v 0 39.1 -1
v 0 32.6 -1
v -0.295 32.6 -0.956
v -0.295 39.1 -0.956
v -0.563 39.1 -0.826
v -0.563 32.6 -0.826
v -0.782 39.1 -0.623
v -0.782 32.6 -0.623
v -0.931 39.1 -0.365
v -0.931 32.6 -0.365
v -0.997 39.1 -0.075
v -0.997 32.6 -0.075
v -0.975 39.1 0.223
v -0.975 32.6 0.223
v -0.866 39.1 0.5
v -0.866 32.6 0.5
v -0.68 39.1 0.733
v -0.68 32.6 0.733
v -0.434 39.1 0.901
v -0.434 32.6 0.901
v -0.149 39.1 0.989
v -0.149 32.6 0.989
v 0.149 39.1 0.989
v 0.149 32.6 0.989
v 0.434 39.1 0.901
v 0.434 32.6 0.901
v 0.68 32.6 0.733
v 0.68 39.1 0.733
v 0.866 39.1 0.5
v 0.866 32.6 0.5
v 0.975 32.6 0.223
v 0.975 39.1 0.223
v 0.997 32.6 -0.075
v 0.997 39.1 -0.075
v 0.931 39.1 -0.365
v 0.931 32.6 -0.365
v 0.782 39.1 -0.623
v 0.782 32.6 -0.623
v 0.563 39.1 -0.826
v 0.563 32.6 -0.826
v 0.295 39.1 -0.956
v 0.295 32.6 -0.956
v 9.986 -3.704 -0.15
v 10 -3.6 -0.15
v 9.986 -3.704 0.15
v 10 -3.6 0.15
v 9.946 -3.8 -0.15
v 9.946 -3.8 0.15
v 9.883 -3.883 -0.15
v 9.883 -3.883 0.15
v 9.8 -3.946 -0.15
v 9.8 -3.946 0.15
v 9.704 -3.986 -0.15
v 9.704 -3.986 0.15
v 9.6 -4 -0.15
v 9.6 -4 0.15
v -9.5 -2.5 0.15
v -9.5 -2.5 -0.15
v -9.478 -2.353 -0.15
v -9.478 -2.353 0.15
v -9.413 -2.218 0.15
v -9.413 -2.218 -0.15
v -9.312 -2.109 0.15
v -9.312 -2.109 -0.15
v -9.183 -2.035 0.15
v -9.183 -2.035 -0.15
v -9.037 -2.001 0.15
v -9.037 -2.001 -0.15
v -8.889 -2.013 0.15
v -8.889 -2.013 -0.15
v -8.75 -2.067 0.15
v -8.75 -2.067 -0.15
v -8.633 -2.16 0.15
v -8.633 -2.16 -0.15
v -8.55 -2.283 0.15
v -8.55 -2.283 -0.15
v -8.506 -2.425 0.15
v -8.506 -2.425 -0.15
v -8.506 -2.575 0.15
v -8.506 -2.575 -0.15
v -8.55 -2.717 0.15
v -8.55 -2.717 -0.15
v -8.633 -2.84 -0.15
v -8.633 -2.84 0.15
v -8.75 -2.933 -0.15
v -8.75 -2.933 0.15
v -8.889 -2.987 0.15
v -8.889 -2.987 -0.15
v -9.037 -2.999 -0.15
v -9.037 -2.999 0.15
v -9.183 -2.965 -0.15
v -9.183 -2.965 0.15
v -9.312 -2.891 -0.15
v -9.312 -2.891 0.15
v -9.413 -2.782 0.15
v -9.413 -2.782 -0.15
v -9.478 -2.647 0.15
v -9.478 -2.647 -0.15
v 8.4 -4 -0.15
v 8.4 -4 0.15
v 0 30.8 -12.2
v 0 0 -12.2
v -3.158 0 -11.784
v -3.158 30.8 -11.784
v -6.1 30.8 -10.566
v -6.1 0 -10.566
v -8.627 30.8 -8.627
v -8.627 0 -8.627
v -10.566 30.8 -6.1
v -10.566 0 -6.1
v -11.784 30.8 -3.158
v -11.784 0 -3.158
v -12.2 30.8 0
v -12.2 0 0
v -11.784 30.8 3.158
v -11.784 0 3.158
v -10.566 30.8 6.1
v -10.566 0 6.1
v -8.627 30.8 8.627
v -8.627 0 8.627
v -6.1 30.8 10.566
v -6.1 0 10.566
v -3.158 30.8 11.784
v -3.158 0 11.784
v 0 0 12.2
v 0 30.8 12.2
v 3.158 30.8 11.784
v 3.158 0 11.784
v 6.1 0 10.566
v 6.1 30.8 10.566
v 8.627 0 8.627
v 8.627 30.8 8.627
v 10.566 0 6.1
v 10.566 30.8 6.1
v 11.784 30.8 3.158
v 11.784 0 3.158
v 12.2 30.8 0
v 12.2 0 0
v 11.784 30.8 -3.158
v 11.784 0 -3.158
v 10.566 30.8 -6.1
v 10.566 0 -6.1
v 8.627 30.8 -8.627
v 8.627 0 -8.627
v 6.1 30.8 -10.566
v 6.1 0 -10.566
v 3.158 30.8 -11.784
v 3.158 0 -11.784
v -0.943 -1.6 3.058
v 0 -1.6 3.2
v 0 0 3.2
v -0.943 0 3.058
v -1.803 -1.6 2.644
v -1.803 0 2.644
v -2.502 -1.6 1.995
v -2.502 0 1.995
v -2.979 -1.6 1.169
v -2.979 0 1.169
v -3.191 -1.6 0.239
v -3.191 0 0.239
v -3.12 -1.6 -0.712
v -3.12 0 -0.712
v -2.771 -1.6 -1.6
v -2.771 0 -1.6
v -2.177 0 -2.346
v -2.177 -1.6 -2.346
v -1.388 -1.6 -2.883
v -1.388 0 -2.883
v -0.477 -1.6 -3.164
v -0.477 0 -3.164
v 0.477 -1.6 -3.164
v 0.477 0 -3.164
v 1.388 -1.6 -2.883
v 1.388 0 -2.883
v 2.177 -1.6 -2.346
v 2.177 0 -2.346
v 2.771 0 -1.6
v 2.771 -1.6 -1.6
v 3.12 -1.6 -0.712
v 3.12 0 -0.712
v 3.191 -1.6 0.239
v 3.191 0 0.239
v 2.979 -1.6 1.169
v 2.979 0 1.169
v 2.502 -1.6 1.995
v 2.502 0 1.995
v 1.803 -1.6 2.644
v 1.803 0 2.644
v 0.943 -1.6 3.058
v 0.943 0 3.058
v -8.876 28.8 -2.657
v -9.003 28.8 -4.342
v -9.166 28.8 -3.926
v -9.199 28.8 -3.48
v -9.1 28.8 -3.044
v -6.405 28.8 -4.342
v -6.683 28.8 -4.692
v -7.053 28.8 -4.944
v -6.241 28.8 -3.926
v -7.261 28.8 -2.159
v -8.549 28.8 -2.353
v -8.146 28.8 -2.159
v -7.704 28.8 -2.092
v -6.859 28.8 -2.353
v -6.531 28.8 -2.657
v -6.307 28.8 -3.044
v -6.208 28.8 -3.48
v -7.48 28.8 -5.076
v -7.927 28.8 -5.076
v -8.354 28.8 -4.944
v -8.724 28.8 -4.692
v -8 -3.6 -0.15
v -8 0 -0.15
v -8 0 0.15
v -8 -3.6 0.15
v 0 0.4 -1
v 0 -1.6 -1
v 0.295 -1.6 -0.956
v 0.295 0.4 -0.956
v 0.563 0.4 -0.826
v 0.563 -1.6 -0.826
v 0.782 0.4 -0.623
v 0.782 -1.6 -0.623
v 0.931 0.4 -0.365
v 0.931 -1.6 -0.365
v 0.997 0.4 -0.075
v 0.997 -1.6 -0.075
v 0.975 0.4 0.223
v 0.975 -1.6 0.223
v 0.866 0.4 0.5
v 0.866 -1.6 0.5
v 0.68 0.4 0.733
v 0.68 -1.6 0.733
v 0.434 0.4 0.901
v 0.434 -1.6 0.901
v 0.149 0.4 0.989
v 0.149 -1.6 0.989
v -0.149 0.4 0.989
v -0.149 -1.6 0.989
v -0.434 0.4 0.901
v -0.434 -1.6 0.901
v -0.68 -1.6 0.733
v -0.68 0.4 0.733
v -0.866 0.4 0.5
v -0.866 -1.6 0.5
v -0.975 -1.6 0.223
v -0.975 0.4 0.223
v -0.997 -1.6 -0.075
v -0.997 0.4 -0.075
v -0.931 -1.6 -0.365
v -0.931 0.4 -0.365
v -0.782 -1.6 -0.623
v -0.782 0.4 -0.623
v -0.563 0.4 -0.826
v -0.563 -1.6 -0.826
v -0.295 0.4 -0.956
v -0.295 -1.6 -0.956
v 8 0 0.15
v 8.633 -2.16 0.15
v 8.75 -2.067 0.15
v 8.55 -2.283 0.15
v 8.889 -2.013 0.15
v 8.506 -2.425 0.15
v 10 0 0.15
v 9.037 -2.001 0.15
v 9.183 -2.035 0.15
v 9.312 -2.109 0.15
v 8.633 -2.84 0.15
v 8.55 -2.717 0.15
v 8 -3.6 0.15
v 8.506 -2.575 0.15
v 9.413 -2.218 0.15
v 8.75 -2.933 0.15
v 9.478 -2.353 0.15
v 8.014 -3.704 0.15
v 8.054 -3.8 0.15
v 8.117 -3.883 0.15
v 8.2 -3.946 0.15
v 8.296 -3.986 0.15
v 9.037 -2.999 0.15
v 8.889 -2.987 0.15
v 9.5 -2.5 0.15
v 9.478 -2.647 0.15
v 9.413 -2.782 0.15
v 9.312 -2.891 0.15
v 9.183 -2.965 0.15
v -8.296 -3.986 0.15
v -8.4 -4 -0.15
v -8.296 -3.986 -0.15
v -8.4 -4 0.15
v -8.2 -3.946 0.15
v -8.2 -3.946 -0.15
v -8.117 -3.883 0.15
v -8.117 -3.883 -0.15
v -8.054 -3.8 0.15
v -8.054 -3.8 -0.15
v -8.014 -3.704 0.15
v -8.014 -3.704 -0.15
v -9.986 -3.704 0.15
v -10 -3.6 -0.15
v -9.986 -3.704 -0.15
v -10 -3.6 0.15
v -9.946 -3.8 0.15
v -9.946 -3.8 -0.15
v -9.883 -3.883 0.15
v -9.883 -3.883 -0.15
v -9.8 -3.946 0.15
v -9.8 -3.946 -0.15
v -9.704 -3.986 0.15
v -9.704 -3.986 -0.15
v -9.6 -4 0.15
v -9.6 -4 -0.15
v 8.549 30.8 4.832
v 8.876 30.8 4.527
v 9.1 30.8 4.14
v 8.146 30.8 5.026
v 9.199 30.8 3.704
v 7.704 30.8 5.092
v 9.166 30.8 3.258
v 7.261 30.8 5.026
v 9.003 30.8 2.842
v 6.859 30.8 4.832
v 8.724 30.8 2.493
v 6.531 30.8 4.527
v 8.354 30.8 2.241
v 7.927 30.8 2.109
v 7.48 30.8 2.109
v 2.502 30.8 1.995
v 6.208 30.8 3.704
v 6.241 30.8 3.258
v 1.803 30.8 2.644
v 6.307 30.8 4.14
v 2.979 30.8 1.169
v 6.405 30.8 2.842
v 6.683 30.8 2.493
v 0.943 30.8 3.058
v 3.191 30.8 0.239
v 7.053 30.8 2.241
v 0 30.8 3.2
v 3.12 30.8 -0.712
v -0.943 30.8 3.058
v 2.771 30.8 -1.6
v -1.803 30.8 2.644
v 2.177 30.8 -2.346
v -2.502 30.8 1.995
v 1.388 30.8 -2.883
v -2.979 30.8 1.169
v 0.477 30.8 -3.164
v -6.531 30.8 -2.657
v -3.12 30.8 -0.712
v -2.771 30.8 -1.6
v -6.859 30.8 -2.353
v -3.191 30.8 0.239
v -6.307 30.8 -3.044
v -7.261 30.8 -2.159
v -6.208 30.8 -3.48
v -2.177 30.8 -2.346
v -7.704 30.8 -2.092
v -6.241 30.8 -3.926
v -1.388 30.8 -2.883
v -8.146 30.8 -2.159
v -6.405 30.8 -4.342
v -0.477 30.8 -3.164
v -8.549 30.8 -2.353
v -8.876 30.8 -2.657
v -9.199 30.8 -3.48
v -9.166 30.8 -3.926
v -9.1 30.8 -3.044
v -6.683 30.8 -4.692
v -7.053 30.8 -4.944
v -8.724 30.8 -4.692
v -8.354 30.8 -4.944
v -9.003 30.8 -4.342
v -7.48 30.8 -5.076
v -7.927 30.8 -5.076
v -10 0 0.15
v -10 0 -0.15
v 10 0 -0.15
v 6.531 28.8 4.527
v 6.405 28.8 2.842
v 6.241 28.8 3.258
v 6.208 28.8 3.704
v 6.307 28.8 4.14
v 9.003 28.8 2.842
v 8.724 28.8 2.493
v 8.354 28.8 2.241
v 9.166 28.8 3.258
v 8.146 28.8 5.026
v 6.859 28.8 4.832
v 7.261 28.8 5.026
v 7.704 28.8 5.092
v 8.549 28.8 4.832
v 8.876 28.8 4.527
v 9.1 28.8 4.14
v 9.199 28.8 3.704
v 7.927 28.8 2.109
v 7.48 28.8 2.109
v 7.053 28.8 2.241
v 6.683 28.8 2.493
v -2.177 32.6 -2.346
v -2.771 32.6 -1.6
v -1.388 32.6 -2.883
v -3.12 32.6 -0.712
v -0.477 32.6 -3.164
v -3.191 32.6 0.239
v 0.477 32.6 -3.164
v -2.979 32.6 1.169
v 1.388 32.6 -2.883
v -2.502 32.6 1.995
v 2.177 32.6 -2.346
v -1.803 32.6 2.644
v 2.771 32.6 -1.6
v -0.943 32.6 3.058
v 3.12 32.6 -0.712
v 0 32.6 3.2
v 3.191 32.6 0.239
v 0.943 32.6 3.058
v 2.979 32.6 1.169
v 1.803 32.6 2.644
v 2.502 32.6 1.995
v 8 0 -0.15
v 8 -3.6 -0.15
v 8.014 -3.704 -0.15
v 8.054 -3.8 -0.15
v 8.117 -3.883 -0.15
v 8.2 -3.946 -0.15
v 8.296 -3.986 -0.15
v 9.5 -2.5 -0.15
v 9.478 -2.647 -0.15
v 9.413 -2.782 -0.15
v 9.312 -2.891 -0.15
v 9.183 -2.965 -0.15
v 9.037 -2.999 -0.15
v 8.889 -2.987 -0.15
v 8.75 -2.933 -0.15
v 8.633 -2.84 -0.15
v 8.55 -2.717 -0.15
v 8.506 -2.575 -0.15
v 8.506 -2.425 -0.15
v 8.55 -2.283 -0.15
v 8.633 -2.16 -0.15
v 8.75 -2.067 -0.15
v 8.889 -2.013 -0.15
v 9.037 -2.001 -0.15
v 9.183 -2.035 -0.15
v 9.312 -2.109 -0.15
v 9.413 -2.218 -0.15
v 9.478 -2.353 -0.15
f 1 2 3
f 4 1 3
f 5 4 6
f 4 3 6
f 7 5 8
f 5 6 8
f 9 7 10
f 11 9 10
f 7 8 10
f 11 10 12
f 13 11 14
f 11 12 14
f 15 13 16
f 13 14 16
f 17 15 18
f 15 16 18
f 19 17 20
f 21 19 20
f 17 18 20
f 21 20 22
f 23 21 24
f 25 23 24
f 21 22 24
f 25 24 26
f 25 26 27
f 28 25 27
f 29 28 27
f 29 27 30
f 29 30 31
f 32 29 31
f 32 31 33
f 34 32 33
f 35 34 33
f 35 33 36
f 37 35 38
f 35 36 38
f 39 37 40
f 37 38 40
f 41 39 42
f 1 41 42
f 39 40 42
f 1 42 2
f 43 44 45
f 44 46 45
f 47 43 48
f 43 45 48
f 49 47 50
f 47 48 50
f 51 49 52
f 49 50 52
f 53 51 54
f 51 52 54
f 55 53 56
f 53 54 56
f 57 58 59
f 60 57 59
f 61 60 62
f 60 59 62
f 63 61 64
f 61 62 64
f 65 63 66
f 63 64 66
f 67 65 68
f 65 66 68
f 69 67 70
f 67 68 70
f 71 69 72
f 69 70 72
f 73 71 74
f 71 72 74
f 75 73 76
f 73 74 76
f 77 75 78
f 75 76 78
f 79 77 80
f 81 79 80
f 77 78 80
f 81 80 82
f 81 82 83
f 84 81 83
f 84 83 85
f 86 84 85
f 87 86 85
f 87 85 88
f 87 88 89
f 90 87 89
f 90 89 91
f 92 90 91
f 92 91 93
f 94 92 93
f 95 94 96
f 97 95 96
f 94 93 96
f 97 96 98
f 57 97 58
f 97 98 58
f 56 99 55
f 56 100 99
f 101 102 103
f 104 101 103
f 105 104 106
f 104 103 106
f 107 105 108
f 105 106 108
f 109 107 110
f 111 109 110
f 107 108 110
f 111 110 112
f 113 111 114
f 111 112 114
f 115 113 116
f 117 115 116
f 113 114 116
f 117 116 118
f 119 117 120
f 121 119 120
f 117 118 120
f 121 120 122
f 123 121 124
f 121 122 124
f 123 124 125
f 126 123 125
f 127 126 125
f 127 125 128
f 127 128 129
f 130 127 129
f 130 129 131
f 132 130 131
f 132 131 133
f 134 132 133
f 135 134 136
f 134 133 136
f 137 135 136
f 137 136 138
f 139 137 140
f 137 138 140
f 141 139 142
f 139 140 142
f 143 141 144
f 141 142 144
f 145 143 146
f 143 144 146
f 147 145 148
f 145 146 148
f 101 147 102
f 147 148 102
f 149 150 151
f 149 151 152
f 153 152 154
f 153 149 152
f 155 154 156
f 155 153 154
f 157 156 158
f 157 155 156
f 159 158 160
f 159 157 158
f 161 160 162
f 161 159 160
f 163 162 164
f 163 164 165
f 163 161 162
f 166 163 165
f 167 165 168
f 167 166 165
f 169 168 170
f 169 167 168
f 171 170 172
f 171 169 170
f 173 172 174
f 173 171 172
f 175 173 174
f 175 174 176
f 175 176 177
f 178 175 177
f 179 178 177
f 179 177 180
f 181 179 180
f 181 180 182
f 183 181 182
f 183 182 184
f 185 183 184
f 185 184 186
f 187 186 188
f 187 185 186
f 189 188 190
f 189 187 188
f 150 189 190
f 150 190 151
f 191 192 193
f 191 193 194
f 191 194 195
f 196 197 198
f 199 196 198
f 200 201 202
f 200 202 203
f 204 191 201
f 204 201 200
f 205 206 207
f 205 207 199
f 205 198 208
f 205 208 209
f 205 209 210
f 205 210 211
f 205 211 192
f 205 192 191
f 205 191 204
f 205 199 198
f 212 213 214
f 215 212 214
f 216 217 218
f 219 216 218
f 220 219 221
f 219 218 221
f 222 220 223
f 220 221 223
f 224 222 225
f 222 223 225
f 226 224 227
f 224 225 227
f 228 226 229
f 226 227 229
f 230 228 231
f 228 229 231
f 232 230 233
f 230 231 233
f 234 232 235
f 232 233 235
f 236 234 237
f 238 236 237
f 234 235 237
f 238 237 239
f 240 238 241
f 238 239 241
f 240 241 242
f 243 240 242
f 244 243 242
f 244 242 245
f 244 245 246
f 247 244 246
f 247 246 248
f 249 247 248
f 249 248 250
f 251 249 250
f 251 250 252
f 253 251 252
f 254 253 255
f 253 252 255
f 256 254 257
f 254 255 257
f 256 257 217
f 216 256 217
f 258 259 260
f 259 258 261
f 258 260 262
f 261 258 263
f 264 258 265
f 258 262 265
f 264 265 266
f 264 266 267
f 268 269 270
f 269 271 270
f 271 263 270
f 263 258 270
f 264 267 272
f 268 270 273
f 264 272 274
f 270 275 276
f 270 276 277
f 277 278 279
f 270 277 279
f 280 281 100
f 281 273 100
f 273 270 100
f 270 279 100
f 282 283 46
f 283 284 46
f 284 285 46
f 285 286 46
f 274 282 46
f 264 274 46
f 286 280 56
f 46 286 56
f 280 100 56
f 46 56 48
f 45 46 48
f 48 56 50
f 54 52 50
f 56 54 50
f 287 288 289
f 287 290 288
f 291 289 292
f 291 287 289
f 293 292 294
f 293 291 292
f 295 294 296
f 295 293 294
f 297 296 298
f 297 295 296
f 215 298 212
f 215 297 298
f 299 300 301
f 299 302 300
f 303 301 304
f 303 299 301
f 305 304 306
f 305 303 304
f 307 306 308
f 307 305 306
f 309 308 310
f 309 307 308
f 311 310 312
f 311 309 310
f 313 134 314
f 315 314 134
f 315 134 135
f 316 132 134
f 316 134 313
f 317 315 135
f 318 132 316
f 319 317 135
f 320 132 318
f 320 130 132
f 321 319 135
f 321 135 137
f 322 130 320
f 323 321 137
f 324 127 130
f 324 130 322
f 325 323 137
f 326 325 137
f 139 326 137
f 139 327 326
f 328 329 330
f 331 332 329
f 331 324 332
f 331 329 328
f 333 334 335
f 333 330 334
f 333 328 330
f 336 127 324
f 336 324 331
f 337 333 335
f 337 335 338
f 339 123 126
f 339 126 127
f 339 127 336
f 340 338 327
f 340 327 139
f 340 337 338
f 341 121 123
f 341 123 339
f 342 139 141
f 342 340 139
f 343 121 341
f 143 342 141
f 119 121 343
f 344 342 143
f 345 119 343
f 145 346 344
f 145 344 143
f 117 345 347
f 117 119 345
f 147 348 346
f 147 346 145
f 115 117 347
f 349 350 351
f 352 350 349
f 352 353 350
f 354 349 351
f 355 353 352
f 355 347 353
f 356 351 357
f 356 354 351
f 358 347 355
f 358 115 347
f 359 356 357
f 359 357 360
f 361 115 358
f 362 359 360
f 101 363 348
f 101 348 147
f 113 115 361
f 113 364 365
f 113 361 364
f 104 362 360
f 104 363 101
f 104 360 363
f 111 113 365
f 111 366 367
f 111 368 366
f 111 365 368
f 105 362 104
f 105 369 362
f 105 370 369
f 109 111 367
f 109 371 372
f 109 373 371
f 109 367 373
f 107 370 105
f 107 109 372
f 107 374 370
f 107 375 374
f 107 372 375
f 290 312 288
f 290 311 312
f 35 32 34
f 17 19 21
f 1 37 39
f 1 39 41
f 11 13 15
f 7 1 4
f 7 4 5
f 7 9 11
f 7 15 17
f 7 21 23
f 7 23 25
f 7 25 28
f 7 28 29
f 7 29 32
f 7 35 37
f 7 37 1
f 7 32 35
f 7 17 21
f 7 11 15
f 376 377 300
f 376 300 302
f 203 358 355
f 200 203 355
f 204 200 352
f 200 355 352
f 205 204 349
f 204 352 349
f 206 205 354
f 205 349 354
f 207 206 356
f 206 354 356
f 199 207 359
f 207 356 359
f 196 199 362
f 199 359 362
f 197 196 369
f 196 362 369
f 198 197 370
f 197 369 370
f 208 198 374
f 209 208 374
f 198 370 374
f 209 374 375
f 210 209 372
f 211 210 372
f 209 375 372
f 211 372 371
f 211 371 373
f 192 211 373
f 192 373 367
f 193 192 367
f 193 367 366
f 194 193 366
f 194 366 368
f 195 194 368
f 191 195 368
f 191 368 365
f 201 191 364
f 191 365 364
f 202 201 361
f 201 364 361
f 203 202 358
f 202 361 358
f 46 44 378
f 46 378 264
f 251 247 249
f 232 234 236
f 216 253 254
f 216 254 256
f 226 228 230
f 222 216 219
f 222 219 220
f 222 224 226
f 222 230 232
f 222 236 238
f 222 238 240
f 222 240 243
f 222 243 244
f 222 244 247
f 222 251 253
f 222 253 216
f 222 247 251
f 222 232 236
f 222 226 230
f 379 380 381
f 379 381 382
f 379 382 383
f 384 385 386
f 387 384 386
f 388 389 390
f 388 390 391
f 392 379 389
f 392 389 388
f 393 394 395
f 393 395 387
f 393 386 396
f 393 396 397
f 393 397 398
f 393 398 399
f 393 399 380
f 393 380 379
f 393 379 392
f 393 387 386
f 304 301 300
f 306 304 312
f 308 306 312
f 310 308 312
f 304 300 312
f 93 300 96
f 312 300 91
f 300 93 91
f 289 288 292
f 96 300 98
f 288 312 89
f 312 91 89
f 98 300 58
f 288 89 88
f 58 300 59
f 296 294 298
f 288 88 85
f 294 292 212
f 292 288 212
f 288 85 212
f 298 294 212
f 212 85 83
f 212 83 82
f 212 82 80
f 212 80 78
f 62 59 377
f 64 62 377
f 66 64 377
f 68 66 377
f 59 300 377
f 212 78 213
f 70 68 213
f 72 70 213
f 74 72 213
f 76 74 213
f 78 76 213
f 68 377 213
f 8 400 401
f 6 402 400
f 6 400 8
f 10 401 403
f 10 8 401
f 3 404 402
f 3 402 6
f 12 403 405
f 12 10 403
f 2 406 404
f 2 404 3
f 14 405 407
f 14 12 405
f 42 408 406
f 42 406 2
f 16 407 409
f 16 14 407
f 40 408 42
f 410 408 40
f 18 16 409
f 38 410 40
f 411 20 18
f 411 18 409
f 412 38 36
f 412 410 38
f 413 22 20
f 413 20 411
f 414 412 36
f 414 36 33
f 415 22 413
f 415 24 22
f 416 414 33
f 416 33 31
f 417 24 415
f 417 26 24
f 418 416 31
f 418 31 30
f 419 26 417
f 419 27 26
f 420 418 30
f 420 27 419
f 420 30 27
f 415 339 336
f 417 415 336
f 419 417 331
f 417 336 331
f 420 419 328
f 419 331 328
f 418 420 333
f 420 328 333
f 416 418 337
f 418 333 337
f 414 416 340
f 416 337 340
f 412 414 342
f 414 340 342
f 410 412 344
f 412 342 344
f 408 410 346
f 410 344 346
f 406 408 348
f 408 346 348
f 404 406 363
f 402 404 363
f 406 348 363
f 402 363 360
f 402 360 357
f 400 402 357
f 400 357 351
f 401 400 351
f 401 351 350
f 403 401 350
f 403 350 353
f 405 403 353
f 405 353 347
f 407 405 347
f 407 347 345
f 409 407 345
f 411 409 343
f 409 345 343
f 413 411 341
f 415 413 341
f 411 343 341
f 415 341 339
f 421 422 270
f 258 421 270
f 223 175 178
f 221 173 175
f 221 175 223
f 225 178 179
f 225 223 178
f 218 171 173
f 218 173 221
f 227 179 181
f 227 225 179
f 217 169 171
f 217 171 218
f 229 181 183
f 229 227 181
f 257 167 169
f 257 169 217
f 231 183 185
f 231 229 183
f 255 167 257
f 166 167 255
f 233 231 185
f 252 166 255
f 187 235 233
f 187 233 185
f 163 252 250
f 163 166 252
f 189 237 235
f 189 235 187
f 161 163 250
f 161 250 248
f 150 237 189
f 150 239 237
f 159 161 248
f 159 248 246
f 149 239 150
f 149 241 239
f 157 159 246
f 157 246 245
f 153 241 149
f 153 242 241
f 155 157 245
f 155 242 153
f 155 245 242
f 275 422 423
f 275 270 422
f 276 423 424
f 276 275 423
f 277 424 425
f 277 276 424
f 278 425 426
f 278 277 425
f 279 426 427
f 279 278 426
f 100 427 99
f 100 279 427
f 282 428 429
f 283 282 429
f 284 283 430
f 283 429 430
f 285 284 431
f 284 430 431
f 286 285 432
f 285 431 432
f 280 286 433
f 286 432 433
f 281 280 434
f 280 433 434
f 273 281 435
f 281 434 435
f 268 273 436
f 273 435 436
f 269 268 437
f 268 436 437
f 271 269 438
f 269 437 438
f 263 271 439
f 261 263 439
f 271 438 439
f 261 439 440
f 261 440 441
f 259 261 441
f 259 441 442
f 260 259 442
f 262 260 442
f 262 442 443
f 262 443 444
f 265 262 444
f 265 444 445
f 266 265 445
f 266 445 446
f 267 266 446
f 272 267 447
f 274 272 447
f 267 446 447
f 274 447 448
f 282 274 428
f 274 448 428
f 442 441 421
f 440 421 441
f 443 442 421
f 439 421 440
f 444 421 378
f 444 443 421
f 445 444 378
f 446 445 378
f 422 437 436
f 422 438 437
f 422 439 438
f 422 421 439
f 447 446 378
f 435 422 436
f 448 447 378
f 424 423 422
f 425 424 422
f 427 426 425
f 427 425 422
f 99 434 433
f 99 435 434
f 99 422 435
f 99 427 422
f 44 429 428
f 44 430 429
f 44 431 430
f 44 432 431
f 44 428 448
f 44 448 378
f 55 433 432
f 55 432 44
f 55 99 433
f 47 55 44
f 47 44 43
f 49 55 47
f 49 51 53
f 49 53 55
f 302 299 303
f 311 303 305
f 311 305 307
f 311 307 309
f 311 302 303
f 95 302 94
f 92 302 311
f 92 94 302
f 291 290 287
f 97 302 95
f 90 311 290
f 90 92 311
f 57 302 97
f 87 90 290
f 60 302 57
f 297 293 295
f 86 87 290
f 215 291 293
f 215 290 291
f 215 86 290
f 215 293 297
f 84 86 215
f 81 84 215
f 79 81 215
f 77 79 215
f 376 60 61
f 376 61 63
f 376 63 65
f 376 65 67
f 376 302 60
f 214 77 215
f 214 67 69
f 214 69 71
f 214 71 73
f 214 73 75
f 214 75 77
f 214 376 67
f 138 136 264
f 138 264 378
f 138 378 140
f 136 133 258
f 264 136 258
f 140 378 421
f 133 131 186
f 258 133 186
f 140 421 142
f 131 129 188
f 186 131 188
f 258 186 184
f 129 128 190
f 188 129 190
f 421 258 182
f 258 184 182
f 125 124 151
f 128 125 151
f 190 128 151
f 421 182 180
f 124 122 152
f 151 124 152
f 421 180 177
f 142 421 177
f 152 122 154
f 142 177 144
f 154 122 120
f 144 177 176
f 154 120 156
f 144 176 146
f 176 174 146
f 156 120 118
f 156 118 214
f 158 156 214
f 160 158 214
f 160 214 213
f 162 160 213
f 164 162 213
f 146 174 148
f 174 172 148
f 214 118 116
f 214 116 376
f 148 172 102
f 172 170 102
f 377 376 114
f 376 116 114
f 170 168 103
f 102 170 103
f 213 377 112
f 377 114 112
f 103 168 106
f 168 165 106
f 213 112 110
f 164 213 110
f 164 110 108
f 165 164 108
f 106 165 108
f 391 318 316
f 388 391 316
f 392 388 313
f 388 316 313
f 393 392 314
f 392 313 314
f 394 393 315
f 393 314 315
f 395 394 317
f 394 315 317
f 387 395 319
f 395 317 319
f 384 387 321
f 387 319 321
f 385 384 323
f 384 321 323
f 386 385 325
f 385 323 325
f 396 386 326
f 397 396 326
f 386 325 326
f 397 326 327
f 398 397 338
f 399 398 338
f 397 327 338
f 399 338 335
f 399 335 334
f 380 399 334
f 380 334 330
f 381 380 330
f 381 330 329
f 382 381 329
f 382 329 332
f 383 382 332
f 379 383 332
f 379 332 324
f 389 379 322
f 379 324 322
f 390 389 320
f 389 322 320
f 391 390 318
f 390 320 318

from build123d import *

# Parameters (mm, degrees)
SKETCH_1_R          = 12.2
EXTRUDE_1_DEPTH     = 30.8
SKETCH_2_R          = 3.2
EXTRUDE_2_DEPTH     = 1.8
SKETCH_3_R          = 1
EXTRUDE_3_DEPTH     = 6.5
SKETCH_4_R          = 1.5
CUT_EXTRUDE_1_DEPTH = 2
EXTRUDE_START       = 1.6
SKETCH_5_R          = 3.2
SKETCH_5_W          = 2
SKETCH_5_H          = 0.3
EXTRUDE_4_DEPTH     = 1.6
SKETCH_6_W          = 2
SKETCH_6_H          = 0.3
EXTRUDE_5_DEPTH     = 2.4
SKETCH_7_R          = 1
CUT_EXTRUDE_2_DEPTH = 2
SKETCH_8_R          = 0.5
CUT_EXTRUDE_4_DEPTH = 0.3
FILLET_4_R          = 0.4


with BuildPart() as part:
    # 草图1 → 凸台-拉伸1 (new body)
    with BuildSketch(Plane(origin=(0, 0, 0), x_dir=(1, 0, 0), z_dir=(0, 1, 0))):
        with Locations(Location((0, 0, 0), (0, 0, 90))):
            Circle(SKETCH_1_R)
    extrude(amount=EXTRUDE_1_DEPTH)

    # 草图2 → 凸台-拉伸2 (add)
    with BuildSketch(Plane(origin=(0, 30.8, 0), x_dir=(1, 0, 0), z_dir=(0, 1, 0))):
        with Locations(Location((0, 0, 0), (0, 0, 270))):
            Circle(SKETCH_2_R)
    extrude(amount=EXTRUDE_2_DEPTH)

    # 草图3 → 凸台-拉伸3 (add)
    with BuildSketch(Plane(origin=(0, 32.6, 0), x_dir=(1, 0, 0), z_dir=(0, 1, 0))):
        with Locations(Location((0, 0, 0), (0, 0, 90))):
            Circle(SKETCH_3_R)
    extrude(amount=EXTRUDE_3_DEPTH)

    # 草图4 → 切除-拉伸1 (cut)
    with BuildSketch(Plane(origin=(0, 30.8, 0), x_dir=(1, 0, 0), z_dir=(0, 1, 0))):
        with Locations(Location((7.70361619, -3.592255225, 0), (0, 0, 270))):
            Circle(SKETCH_4_R)
        with Locations(Location((-7.70361619, 3.592255225, 0), (0, 0, 270))):
            Circle(SKETCH_4_R)
    extrude(amount=-CUT_EXTRUDE_1_DEPTH, mode=Mode.SUBTRACT)

    # 草图5 → 凸台-拉伸4 (add)
    with BuildSketch(Plane.XZ.offset(EXTRUDE_START)):
        with Locations(Location((0, 0, 0), (0, 0, 90))):
            Circle(SKETCH_5_R)
        with Locations((-9, 0)):
            Rectangle(SKETCH_5_W, SKETCH_5_H)
        with Locations((9, 0)):
            Rectangle(SKETCH_5_W, SKETCH_5_H)
    extrude(amount=-EXTRUDE_4_DEPTH)

    # 草图6 → 凸台-拉伸5 (add)
    with BuildSketch(Plane.XZ.offset(1.6)):
        with Locations((-9, 0)):
            Rectangle(SKETCH_6_W, SKETCH_6_H)
        with Locations((9, 0)):
            Rectangle(SKETCH_6_W, SKETCH_6_H)
    extrude(amount=EXTRUDE_5_DEPTH)

    # 草图7 → 切除-拉伸2 (cut)
    with BuildSketch(Plane.XZ.offset(1.6)):
        with Locations(Location((0, 0, 0), (0, 0, 270))):
            Circle(SKETCH_7_R)
    extrude(amount=-CUT_EXTRUDE_2_DEPTH, mode=Mode.SUBTRACT)

    # 草图8 → 切除-拉伸4 (cut)
    with BuildSketch(Plane(origin=(0, 0, -0.15), x_dir=(-1, 0, 0), z_dir=(0, 0, -1))):
        with Locations((9, -2.5)):
            Circle(SKETCH_8_R)
        with Locations(Location((-9, -2.5, 0), (0, 0, 180))):
            Circle(SKETCH_8_R)
    extrude(amount=-CUT_EXTRUDE_4_DEPTH, mode=Mode.SUBTRACT)

    # 圆角4
    fillet_4_edges = [part.edges().sort_by_distance(p)[0] for p in [
        (-10, -4, 0),
        (-8, -4, 0),
        (10, -4, 0),
        (8, -4, 0),
    ]]
    fillet(fillet_4_edges, radius=FILLET_4_R)


solid = part.part
